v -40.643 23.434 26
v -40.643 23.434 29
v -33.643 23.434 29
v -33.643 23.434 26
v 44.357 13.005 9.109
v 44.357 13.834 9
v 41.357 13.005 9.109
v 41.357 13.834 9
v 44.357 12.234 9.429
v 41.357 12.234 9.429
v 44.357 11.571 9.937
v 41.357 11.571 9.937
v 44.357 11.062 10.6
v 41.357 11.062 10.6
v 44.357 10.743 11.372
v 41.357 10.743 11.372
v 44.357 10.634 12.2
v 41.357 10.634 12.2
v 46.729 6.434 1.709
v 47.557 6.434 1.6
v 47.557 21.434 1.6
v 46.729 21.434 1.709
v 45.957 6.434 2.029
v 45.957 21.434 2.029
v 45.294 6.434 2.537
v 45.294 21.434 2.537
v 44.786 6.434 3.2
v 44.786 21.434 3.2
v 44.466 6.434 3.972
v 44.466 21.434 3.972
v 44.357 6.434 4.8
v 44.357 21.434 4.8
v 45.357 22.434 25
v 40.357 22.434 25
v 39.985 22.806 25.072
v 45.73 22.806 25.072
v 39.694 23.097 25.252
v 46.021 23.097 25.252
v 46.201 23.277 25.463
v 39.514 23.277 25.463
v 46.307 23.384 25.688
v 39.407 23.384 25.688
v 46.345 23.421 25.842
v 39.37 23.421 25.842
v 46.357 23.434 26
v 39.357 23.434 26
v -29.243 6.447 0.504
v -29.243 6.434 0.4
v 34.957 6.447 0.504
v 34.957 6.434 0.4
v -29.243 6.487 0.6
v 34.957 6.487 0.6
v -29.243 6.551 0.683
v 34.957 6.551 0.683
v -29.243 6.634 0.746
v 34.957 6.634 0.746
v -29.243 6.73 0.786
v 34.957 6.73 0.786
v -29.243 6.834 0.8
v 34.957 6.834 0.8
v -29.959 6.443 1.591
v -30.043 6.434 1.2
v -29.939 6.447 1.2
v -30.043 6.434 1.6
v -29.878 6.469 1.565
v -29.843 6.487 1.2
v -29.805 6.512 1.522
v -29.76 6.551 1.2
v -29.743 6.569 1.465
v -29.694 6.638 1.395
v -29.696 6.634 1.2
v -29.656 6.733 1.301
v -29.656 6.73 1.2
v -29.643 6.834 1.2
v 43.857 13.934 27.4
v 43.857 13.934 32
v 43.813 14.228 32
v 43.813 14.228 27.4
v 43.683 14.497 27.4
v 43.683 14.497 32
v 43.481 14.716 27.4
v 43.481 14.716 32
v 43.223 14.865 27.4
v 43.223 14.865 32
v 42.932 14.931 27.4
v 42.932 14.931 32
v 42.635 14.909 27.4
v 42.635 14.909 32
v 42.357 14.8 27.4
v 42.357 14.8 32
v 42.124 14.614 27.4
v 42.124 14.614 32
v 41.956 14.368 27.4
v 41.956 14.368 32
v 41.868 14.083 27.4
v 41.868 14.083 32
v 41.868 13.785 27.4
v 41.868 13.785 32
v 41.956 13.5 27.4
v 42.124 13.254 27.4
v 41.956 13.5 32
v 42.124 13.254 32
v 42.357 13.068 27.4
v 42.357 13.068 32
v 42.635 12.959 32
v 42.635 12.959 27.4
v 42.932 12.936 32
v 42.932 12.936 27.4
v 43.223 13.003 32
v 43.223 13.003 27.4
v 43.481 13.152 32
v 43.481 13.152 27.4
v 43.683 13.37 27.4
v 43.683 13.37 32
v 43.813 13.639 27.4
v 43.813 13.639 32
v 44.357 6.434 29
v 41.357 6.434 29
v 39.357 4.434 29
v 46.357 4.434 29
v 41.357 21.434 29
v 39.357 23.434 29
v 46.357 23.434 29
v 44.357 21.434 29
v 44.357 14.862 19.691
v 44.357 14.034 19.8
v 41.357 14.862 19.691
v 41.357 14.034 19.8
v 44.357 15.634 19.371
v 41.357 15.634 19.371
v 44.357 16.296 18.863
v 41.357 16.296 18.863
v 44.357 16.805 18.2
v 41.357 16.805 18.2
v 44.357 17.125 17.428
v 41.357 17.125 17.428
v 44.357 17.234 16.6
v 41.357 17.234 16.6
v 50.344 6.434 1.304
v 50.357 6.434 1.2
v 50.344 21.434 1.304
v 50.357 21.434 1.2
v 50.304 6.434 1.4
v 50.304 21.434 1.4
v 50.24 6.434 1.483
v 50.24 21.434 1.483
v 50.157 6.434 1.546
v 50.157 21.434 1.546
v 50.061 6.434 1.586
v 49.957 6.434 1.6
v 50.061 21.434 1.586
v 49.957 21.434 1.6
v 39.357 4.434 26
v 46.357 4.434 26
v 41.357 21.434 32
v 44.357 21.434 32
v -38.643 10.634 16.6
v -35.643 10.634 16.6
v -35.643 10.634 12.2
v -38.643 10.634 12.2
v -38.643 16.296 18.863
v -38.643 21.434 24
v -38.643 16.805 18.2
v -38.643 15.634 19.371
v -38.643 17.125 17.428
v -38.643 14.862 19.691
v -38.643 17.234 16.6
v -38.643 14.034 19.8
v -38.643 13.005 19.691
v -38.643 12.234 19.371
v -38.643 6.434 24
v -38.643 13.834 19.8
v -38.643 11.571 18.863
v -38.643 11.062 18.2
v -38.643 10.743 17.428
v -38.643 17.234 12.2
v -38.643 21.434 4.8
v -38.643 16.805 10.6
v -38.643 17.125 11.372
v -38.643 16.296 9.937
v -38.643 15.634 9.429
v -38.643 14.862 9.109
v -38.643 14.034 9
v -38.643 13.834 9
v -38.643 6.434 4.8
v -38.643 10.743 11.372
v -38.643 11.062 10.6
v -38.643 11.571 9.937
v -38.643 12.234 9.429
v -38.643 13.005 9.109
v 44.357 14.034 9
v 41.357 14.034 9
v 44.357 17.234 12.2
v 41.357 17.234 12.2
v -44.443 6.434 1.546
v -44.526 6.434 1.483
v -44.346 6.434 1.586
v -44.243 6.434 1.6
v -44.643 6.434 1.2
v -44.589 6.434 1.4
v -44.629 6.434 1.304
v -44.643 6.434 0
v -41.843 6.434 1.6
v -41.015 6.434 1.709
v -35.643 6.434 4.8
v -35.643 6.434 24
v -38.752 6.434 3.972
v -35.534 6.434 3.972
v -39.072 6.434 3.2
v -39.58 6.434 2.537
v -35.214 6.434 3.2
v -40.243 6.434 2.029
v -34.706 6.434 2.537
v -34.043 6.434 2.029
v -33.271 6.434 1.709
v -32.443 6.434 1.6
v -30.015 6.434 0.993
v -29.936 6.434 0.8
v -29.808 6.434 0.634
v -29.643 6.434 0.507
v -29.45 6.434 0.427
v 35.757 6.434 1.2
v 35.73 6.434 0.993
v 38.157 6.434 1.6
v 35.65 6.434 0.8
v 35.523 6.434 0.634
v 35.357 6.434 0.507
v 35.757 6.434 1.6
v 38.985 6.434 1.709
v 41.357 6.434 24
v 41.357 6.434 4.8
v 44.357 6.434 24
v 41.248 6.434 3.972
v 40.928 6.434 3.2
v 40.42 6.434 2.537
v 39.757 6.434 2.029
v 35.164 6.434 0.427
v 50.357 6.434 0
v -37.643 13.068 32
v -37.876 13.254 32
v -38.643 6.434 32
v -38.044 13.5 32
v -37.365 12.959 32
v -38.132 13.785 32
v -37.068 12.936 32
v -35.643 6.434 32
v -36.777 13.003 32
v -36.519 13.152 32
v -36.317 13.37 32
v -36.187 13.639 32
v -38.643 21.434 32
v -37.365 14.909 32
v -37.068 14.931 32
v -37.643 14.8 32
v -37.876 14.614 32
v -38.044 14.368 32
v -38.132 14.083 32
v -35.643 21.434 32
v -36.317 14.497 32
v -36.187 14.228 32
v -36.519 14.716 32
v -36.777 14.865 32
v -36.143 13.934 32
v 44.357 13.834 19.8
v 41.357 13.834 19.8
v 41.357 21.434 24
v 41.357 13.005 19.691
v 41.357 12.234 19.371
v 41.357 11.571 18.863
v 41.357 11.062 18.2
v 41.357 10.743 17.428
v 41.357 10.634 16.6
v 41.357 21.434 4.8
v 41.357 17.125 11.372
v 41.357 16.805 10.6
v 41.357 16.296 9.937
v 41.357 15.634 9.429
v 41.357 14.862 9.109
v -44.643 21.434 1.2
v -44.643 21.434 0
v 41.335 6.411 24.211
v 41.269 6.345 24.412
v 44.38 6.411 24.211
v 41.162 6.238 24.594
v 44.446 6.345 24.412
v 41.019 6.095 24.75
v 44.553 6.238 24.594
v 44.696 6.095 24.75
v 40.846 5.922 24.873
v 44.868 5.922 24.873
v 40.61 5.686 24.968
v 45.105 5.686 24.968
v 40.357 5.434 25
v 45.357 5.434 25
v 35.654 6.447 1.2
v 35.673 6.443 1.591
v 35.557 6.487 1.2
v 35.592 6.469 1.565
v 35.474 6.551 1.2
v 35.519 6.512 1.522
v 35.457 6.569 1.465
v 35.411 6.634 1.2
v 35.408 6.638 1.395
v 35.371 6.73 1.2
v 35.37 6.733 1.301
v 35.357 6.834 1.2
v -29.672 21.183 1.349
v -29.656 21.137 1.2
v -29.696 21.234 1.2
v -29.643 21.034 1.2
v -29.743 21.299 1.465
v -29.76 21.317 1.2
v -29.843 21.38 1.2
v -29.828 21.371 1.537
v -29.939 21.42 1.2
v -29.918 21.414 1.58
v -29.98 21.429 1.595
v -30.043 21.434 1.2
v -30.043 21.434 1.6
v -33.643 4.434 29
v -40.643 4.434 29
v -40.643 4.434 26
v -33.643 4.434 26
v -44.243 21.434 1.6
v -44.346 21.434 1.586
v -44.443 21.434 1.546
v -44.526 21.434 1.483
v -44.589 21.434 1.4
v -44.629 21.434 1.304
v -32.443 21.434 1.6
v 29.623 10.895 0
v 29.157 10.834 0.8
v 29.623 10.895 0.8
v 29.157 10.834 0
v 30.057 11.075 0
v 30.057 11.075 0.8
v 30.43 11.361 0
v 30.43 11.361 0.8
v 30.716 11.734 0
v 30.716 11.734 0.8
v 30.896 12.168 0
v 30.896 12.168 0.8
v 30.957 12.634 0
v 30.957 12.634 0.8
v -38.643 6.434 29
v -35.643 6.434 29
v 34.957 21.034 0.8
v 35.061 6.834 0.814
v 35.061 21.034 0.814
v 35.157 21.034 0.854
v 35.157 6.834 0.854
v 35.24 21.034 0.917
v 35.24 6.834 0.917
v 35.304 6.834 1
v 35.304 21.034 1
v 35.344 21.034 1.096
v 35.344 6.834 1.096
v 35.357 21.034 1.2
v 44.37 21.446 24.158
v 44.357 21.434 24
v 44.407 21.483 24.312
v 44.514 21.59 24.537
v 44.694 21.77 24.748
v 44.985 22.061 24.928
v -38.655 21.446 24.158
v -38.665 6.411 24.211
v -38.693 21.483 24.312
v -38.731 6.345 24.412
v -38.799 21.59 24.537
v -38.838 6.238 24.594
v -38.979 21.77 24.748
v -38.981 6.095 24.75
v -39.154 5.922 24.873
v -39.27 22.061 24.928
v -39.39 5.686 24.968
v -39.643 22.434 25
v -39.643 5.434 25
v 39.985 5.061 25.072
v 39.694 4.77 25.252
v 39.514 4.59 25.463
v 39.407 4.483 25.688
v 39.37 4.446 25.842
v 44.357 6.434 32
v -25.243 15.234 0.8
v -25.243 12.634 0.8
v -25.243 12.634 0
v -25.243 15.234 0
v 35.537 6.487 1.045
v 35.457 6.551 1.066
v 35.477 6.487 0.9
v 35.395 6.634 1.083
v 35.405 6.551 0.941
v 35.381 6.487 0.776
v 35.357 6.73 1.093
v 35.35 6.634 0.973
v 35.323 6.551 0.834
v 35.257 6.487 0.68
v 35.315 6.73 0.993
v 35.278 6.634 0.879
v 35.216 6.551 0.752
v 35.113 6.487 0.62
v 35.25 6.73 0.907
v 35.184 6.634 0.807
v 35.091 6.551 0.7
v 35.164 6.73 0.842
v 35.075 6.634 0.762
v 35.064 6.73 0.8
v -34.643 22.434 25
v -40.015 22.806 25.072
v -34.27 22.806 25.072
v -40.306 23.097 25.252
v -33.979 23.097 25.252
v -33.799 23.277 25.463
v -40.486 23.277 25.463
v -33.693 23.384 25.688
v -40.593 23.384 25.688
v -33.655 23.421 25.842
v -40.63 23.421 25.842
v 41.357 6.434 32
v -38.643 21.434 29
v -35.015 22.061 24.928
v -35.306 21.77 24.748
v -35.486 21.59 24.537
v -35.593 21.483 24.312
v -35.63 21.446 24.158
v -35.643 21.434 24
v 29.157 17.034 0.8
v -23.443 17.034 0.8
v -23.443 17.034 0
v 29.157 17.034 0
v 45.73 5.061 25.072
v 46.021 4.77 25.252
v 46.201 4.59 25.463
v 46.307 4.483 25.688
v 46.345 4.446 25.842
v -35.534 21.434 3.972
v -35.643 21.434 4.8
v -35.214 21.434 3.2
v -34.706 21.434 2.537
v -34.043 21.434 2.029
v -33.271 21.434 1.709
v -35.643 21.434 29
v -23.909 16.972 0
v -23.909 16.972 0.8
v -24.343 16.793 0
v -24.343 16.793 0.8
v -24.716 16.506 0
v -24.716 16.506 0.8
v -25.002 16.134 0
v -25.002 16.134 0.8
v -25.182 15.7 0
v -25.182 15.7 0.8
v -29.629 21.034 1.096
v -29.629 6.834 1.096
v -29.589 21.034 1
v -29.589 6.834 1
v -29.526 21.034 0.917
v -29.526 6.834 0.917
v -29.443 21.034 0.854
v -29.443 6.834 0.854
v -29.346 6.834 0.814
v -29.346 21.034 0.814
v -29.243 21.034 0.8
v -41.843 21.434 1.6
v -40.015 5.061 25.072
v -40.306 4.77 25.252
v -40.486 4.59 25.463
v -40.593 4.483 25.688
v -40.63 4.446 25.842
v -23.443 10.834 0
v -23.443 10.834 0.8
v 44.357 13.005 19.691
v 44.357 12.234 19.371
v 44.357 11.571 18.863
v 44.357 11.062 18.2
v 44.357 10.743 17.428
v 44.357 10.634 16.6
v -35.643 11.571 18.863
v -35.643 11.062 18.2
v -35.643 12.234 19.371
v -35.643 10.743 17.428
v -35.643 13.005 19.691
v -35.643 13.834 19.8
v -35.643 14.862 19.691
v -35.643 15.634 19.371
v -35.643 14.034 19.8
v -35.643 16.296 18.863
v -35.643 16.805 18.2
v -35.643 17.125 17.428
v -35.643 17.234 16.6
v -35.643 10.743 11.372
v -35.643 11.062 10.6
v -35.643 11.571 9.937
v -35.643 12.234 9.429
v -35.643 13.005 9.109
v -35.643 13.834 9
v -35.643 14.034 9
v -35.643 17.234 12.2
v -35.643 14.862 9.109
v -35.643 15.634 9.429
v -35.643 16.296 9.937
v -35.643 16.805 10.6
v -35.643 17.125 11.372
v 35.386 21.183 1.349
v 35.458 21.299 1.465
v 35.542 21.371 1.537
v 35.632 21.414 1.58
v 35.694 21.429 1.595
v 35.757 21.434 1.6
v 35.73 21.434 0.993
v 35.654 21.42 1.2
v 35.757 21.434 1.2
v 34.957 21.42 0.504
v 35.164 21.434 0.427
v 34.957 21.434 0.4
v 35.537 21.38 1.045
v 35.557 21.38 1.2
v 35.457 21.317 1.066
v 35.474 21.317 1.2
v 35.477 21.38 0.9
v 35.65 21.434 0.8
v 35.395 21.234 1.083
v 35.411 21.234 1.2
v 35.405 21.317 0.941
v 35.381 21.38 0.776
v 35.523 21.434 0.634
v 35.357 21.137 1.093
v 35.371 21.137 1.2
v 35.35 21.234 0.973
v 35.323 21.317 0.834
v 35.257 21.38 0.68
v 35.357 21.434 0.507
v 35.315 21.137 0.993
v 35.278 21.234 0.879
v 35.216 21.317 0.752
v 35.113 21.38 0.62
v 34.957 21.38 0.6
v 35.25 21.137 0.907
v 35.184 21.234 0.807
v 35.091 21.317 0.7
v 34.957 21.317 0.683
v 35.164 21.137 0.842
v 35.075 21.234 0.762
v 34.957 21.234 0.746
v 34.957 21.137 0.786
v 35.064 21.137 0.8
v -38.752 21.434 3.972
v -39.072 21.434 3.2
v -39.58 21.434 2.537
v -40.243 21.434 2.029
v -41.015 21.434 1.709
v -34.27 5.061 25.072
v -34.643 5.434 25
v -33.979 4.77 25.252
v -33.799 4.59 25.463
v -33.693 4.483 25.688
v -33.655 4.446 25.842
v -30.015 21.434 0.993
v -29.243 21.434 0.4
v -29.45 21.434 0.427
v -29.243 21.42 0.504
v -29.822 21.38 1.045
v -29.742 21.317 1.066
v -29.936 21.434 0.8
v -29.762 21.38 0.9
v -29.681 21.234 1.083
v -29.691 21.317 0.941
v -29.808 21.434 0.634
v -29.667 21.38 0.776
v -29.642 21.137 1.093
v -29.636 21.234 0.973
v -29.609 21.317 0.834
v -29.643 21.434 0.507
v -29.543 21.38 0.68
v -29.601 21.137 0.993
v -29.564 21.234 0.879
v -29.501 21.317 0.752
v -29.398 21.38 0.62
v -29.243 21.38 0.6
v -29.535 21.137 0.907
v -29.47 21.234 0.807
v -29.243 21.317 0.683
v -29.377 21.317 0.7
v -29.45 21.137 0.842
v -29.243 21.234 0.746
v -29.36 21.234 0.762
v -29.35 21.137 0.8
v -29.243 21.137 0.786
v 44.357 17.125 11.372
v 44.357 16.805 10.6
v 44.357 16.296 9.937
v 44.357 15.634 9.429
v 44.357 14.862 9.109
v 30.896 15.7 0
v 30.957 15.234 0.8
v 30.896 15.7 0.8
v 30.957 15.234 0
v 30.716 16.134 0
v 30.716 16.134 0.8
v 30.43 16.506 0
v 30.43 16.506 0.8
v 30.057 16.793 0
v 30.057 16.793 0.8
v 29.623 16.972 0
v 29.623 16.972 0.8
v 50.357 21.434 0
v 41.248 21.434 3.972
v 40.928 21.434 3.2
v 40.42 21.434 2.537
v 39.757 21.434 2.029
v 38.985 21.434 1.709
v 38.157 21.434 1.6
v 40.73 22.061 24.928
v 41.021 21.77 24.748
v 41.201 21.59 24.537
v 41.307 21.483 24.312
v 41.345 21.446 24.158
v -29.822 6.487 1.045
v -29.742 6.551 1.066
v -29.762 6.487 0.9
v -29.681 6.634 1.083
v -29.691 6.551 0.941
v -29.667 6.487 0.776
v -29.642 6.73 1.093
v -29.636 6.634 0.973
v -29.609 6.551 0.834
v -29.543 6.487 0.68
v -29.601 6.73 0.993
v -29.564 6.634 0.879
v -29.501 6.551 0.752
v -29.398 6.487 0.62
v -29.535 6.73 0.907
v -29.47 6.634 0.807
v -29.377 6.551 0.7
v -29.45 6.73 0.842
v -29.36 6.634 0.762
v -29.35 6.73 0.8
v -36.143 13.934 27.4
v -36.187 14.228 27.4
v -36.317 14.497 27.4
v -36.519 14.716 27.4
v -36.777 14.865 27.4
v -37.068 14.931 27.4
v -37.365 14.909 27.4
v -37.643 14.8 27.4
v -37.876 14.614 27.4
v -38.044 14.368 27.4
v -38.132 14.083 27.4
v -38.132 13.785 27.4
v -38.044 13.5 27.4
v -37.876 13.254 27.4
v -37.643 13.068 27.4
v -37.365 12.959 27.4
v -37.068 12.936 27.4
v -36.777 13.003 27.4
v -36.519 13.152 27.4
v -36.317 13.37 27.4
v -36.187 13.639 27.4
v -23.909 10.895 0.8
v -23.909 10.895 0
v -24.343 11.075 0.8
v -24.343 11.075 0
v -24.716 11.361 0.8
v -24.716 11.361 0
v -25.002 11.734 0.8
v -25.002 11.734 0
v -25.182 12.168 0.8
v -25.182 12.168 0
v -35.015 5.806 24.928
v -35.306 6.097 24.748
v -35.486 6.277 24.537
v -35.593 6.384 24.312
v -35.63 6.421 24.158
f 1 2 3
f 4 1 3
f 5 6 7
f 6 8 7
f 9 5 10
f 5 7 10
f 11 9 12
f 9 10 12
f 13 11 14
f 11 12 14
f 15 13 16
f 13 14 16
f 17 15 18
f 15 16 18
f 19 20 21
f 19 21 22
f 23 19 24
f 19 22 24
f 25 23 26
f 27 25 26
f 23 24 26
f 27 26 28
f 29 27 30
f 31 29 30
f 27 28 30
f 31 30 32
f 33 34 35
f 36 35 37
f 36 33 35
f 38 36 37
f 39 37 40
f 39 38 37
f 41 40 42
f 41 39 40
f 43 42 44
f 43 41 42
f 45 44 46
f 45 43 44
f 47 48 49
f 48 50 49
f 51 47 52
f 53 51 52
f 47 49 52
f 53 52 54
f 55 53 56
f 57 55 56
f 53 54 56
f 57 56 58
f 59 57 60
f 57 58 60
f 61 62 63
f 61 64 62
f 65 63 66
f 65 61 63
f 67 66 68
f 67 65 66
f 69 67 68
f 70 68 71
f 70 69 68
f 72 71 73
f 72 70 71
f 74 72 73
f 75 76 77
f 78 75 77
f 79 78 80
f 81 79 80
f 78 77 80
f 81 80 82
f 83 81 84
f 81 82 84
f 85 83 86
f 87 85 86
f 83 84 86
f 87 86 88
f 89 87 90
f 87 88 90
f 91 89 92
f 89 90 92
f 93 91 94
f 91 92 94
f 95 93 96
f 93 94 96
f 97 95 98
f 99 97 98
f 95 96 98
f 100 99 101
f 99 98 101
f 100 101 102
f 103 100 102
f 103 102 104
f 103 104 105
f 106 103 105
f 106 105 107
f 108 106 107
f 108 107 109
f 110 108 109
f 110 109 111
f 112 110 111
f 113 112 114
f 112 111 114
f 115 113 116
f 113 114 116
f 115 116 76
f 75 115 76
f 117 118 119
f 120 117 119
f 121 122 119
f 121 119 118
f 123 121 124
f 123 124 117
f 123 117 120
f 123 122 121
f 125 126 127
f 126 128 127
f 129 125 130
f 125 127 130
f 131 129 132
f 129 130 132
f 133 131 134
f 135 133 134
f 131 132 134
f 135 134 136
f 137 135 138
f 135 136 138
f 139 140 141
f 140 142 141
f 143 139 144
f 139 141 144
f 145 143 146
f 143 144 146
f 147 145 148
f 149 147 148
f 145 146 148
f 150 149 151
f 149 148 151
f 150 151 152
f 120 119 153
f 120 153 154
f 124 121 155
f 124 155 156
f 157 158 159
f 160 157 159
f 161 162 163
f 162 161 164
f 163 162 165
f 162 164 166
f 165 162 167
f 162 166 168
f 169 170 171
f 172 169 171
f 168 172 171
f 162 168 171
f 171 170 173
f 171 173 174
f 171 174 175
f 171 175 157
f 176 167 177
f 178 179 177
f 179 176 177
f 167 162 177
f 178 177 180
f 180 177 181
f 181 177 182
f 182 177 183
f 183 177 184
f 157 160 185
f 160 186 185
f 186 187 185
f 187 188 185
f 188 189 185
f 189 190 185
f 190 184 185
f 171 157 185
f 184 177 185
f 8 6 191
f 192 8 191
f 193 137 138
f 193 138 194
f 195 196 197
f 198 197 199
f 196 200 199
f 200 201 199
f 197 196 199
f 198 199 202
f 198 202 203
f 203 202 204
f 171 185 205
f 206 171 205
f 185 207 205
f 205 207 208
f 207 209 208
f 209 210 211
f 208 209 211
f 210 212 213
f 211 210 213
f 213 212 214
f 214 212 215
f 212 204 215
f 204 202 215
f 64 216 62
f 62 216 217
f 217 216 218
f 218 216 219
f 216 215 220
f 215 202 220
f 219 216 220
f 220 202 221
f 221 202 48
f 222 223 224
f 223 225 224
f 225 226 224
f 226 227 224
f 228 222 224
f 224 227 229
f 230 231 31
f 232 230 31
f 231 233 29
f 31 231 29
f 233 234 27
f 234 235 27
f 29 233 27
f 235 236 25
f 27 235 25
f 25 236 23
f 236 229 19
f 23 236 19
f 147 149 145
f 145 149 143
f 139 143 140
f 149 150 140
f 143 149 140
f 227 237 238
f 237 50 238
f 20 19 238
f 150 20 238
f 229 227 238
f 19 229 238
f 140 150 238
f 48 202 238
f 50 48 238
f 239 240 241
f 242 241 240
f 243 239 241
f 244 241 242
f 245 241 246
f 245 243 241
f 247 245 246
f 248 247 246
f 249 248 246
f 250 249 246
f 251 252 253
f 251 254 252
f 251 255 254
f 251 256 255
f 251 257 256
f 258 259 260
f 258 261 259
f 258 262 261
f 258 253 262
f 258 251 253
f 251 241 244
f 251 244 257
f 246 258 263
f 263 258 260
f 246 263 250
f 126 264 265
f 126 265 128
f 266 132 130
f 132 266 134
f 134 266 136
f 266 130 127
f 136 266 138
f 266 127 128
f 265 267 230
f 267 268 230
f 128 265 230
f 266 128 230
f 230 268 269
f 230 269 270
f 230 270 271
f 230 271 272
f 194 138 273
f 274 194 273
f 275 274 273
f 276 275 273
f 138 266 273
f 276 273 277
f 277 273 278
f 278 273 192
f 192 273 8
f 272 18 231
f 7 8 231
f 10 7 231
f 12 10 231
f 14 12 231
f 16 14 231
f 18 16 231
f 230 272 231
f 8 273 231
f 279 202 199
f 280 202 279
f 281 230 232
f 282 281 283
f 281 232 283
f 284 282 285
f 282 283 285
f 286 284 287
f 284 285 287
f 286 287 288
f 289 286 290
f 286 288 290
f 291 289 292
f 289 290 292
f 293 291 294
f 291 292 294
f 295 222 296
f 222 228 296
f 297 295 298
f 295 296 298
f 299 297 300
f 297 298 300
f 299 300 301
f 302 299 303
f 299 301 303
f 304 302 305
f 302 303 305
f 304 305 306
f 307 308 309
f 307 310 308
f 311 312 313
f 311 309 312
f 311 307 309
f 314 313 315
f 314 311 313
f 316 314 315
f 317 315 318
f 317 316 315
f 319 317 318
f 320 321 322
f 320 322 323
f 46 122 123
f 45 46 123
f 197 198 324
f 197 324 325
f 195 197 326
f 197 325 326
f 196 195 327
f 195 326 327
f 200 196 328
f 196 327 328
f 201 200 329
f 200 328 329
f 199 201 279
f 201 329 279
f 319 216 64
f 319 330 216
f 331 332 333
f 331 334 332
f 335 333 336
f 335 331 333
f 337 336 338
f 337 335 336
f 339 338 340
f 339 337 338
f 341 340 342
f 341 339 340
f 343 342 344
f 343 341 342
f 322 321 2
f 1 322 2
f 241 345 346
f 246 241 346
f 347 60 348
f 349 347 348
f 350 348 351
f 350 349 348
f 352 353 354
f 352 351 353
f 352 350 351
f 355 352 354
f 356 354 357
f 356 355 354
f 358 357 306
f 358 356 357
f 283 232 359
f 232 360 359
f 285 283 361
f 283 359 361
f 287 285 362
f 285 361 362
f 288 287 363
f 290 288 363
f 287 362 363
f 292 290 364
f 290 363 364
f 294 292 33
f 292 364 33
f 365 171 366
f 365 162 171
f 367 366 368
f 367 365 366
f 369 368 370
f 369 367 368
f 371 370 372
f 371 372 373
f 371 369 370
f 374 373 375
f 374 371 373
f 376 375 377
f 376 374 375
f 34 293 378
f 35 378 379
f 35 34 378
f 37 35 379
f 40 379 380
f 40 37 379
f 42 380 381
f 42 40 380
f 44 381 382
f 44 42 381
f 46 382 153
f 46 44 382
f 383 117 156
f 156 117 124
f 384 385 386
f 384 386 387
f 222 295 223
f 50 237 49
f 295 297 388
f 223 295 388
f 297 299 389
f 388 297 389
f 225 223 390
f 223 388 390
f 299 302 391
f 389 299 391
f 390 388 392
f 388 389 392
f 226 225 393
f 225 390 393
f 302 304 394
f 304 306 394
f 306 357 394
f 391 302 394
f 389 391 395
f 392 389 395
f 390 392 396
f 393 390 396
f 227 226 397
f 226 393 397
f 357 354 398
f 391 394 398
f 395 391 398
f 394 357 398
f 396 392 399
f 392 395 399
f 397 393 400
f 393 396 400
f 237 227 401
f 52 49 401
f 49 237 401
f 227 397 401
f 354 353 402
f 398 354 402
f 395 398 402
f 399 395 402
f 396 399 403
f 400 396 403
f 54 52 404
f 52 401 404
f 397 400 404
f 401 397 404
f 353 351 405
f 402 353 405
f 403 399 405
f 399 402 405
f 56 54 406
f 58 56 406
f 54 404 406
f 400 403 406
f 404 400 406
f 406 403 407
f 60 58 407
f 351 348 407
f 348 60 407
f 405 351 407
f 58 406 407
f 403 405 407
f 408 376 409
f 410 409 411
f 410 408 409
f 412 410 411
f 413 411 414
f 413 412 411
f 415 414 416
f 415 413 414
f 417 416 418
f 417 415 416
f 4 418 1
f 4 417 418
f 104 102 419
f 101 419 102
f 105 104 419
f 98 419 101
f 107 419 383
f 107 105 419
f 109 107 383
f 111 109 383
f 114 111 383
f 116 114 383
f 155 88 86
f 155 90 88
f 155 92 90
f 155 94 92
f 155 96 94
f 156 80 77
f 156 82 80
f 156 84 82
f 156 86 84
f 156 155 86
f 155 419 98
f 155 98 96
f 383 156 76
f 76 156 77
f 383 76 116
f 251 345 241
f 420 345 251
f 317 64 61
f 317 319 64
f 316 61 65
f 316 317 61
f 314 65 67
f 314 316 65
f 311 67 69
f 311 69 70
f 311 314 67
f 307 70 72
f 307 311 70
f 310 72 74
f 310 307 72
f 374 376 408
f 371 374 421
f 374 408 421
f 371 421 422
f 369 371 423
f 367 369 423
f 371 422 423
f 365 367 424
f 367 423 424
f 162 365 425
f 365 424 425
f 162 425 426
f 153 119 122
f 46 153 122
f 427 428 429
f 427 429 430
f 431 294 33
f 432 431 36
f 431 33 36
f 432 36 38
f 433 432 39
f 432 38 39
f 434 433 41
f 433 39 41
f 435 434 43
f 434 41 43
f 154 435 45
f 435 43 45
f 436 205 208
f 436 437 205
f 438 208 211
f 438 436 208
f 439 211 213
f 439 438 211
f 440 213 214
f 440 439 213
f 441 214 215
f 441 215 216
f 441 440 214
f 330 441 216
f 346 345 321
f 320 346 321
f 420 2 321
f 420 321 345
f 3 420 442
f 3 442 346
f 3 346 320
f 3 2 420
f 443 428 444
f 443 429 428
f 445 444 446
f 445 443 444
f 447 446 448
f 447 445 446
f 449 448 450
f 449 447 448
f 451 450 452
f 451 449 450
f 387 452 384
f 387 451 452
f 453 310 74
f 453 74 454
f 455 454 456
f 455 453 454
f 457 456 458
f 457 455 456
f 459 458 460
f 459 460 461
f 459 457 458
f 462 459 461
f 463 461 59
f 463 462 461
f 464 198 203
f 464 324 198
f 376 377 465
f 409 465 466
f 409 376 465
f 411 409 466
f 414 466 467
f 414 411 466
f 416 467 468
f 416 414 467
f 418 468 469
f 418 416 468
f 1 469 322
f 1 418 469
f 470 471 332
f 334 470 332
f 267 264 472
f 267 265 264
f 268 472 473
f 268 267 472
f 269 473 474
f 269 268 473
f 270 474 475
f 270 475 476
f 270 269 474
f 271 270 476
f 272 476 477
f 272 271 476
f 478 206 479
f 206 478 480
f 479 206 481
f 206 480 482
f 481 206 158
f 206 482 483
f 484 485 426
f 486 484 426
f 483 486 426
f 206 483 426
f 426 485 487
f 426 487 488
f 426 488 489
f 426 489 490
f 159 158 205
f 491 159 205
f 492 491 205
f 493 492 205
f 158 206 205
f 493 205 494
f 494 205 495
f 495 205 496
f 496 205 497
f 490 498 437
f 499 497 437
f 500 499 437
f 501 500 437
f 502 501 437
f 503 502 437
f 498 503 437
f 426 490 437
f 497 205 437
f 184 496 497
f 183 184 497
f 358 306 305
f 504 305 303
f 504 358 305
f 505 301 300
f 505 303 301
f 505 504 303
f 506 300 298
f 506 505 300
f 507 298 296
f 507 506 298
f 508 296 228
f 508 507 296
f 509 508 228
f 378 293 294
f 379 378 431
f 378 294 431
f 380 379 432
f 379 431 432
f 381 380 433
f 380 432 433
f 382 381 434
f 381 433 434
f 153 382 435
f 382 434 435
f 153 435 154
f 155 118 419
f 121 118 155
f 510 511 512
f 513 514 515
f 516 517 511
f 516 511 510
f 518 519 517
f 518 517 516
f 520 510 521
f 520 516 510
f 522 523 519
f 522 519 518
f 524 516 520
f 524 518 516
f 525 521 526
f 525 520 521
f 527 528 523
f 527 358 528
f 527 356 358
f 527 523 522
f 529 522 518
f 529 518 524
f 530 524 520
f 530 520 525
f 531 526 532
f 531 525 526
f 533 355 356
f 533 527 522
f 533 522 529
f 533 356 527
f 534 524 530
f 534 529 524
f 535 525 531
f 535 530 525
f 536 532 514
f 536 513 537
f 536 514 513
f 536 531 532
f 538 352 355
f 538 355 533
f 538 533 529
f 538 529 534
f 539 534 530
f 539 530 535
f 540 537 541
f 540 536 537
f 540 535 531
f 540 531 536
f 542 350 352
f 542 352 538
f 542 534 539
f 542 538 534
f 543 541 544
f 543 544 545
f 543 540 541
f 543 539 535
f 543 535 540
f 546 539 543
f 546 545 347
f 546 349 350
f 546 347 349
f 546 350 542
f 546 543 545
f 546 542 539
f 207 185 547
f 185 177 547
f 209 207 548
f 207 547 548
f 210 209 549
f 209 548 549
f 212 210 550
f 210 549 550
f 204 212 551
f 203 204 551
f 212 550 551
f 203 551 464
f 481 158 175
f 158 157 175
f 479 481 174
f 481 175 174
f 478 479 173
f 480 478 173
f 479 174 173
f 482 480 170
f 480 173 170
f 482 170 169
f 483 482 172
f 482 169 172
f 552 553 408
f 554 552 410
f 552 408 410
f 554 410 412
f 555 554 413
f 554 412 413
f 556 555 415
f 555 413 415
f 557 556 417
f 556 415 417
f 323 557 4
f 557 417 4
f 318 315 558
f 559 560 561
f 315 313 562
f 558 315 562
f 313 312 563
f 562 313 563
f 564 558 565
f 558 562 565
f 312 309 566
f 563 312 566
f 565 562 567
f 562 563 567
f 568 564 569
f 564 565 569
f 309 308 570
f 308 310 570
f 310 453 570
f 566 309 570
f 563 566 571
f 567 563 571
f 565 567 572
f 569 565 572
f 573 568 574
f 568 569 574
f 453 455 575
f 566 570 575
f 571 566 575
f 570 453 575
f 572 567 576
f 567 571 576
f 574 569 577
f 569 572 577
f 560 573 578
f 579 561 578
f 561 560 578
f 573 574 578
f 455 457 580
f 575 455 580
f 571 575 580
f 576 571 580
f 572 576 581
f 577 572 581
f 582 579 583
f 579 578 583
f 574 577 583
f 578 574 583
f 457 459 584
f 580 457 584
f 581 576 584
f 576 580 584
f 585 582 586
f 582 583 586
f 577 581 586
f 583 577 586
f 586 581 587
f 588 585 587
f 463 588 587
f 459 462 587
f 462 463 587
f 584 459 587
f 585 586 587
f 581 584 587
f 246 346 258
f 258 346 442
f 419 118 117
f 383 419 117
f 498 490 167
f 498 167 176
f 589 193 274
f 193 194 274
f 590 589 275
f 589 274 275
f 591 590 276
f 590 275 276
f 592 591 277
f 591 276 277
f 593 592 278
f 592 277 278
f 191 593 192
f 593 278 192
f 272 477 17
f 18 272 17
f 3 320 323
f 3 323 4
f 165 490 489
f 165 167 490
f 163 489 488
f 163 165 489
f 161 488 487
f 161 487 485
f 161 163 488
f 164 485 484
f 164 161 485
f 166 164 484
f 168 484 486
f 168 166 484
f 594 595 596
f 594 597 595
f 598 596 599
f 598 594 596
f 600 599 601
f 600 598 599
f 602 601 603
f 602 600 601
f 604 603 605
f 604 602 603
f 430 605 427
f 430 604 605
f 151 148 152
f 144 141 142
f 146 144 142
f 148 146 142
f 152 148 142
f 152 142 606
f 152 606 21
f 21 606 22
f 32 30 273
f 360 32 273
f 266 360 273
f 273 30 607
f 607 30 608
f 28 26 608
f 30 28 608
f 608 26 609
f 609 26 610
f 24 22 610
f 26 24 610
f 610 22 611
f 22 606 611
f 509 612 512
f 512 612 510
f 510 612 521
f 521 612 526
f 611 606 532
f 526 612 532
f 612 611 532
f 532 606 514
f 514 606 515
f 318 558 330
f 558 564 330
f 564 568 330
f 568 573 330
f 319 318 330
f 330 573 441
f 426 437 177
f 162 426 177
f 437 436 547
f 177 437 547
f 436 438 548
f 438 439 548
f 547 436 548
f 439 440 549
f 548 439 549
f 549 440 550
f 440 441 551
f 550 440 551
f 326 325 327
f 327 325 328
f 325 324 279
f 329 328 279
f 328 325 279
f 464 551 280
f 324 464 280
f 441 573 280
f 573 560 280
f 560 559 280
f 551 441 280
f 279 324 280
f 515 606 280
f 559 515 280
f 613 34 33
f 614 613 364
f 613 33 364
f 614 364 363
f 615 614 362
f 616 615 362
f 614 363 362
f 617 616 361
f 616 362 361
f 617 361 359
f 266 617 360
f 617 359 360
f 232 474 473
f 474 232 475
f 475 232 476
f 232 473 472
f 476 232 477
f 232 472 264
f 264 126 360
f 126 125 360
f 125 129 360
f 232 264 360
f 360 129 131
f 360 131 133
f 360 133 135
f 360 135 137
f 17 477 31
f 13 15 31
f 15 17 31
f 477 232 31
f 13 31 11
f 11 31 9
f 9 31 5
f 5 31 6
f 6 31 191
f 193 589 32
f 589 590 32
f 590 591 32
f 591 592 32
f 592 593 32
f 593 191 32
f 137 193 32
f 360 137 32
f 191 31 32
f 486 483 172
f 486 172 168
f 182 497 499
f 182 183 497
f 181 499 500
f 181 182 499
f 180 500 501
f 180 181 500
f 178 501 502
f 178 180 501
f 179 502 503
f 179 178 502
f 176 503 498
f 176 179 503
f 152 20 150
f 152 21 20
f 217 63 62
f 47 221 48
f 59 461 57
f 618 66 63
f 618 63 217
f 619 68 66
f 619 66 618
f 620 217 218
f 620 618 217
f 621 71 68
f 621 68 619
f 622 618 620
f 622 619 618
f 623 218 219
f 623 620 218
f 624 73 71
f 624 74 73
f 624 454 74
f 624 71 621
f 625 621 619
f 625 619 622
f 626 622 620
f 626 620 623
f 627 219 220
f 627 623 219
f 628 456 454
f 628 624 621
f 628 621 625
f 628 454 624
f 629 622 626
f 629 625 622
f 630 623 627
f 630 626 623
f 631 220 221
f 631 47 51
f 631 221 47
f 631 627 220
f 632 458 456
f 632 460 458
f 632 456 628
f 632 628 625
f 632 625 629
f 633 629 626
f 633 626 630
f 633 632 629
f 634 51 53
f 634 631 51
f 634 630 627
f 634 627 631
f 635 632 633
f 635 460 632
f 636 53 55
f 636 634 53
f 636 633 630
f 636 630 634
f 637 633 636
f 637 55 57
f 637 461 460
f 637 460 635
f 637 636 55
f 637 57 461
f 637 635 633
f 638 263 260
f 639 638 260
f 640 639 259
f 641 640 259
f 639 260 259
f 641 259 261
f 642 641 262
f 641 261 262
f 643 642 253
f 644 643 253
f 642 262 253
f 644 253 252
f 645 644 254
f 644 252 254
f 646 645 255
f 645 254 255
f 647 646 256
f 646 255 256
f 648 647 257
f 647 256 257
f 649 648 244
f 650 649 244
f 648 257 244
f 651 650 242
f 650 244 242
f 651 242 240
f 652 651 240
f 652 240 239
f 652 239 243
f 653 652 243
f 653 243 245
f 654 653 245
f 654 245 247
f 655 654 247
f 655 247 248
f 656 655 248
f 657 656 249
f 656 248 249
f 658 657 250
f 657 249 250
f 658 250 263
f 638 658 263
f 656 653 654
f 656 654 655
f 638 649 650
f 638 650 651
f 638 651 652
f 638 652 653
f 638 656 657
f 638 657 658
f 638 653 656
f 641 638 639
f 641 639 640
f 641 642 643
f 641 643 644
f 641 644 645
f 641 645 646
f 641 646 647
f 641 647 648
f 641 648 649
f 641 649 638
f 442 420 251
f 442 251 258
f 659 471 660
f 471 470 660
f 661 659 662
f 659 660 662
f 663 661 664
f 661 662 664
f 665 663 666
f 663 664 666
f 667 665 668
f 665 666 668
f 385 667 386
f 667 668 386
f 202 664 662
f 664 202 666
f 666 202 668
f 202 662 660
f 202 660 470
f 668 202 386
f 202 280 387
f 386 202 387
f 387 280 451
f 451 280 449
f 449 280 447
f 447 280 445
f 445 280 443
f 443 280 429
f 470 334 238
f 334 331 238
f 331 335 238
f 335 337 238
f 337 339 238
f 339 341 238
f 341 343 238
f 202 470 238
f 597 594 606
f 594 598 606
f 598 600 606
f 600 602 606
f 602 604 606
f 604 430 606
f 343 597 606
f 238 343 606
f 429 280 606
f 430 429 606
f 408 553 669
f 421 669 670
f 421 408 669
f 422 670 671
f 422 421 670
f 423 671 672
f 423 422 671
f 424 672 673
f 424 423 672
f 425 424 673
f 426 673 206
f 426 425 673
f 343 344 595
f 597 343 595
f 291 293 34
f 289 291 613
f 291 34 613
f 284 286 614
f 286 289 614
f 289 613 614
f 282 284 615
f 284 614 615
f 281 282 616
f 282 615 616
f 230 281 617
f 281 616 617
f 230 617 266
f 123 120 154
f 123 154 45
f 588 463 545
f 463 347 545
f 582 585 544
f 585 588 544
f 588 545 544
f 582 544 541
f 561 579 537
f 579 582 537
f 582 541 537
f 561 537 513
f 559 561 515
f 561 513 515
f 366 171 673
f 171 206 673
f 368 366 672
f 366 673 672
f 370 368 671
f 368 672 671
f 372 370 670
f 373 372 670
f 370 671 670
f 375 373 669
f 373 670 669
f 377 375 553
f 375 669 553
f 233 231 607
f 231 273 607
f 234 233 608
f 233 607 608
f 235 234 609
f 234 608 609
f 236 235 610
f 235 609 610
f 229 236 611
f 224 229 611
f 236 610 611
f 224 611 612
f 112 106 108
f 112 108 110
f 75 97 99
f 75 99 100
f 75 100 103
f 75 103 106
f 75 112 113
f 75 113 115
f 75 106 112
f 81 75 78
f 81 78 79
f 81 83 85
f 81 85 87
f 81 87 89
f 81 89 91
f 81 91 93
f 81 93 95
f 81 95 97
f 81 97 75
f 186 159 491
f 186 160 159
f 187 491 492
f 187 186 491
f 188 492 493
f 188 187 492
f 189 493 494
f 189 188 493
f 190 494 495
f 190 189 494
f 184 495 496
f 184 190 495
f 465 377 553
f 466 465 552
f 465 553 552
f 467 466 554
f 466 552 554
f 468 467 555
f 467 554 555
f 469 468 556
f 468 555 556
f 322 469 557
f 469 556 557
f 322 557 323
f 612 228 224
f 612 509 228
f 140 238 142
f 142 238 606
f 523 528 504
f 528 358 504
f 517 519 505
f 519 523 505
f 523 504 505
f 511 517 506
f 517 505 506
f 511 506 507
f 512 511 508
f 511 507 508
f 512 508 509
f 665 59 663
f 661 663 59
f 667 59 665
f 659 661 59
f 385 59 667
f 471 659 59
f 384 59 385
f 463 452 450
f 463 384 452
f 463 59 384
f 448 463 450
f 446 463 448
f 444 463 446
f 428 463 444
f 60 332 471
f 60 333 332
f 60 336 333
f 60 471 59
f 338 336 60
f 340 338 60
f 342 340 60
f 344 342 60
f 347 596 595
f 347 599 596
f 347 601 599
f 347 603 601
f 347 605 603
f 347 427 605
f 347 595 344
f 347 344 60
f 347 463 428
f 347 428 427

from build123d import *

# Parameters (mm, degrees)
SKETCH1_W           = 65
SKETCH1_H           = 15
BOSS_EXTRUDE1_DEPTH = 0.8
SKETCH1_3_W         = 6
SKETCH1_3_H         = 15
BOSS_EXTRUDE2_DEPTH = 1.6
BOSS_EXTRUDE3_DEPTH = 29
SKETCH2_W           = 7
SKETCH2_H           = 19
SKETCH2_W_2         = 3
SKETCH2_H_2         = 15
BOSS_EXTRUDE4_DEPTH = 4
SKETCH2_2_W         = 3
SKETCH2_2_H         = 15
BOSS_EXTRUDE5_DEPTH = 3
SKETCH3_R           = 1
CUT_EXTRUDE1_DEPTH  = 4.6
FILLET1_R           = 3.2
FILLET2_R           = 0.4
FILLET3_R           = 1
SKETCH4_W           = 56.2
SKETCH4_H           = 6.2
CUT_EXTRUDE2_DEPTH  = 64.705737631
FILLET4_R           = 1.8
SKETCH5_W           = 10.8
SKETCH5_H           = 6.6
CUT_EXTRUDE3_DEPTH  = 98.437864541
FILLET5_R           = 3.2


with BuildPart() as part:
    # Sketch1 → Boss-Extrude1 (new body)
    with BuildSketch(Plane.XY):
        with Locations((2.857159974, 13.933681879)):
            Rectangle(SKETCH1_W, SKETCH1_H)
    extrude(amount=BOSS_EXTRUDE1_DEPTH)

    # Sketch1<3> → Boss-Extrude2 (add)
    with BuildSketch(Plane.XY):
        with Locations((-32.642840026, 13.933681879)):
            Rectangle(SKETCH1_3_W, SKETCH1_3_H)
        with Locations((-41.642840026, 13.933681879)):
            Rectangle(SKETCH1_3_W, SKETCH1_3_H)
        with Locations((38.357159974, 13.933681879)):
            Rectangle(SKETCH1_3_W, SKETCH1_3_H)
        with Locations((47.357159974, 13.933681879)):
            Rectangle(SKETCH1_3_W, SKETCH1_3_H)
    extrude(amount=BOSS_EXTRUDE2_DEPTH)


with BuildPart() as boss_extrude2_piece_1:
    # of the separate pieces the step leaves, piece 1, a body of its own (boss_extrude2_pieces)
    add(part.part.solids().sort_by_distance((41.357159974, 21.433681879, 0))[0])



with BuildPart() as boss_extrude2_piece_2:
    # of the separate pieces the step leaves, piece 2, a body of its own (boss_extrude2_pieces)
    add(part.part.solids().sort_by_distance((50.357159974, 6.433681879, 0))[0])


with BuildPart() as boss_extrude2_piece_3:
    # of the separate pieces the step leaves, piece 3, a body of its own (boss_extrude2_pieces)
    add(part.part.solids().sort_by_distance((-38.642840026, 6.433681879, 0))[0])


with BuildPart() as boss_extrude2_piece_1_1:
    add(boss_extrude2_piece_1.part)

    add(boss_extrude2_piece_2.part)  # Boss-Extrude3 merges Boss-Extrude2 piece 2

    add(boss_extrude2_piece_3.part)  # Boss-Extrude3 merges Boss-Extrude2 piece 3
    # Sketch1<4> → Boss-Extrude3 (add)
    with BuildSketch(Plane.XY):
        Polygon((-35.642840026, 6.433681879), (-35.642840026, 21.433681879), (-37.142840026, 21.433681879), (-38.642840026, 21.433681879), (-38.642840026, 6.433681879), (-37.142840026, 6.433681879), align=None)
        Polygon((42.857159974, 21.433681879), (41.357159974, 21.433681879), (41.357159974, 6.433681879), (42.857159974, 6.433681879), (44.357159974, 6.433681879), (44.357159974, 21.433681879), align=None)
    extrude(amount=BOSS_EXTRUDE3_DEPTH)

    # Sketch2 → Boss-Extrude4 (add)
    # profile 1 of 2: a face of its own
    with BuildSketch(Plane.XY.offset(29)):
        with Locations((-37.142840026, 13.933681879)):
            Rectangle(SKETCH2_W, SKETCH2_H)
        with Locations((-37.142840026, 13.933681879)):
            Rectangle(SKETCH2_W_2, SKETCH2_H_2, mode=Mode.SUBTRACT)
    # profile 2 of 2: a face of its own
    with BuildSketch(Plane.XY.offset(29)):
        with Locations((42.857159974, 13.933681879)):
            Rectangle(SKETCH2_W, SKETCH2_H)
        with Locations((42.857159974, 13.933681879)):
            Rectangle(SKETCH2_W_2, SKETCH2_H_2, mode=Mode.SUBTRACT)
    extrude(amount=-BOSS_EXTRUDE4_DEPTH)

    # Sketch2<2> → Boss-Extrude5 (add)
    with BuildSketch(Plane.XY.offset(29)):
        with Locations((-37.142840026, 13.933681879)):
            Rectangle(SKETCH2_2_W, SKETCH2_2_H)
        with Locations((42.857159974, 13.933681879)):
            Rectangle(SKETCH2_2_W, SKETCH2_2_H)
    extrude(amount=BOSS_EXTRUDE5_DEPTH)

    # Sketch3 → Cut-Extrude1 (cut)
    with BuildSketch(Plane.XY.offset(32)):
        with Locations((-37.142840026, 13.933681879)):
            Circle(SKETCH3_R)
        with Locations((42.857159974, 13.933681879)):
            Circle(SKETCH3_R)
    extrude(amount=-CUT_EXTRUDE1_DEPTH, mode=Mode.SUBTRACT)

    # Fillet1
    fillet1_edges = [boss_extrude2_piece_1_1.edges().sort_by_distance(p)[0] for p in [
        (44.357159974, 13.933681879, 1.6),
        (41.357159974, 13.933681879, 1.6),
        (-35.642840026, 13.933681879, 1.6),
        (-38.642840026, 13.933681879, 1.6),
    ]]
    fillet(fillet1_edges, radius=FILLET1_R)

    # Fillet2
    fillet2_edges = [boss_extrude2_piece_1_1.edges().sort_by_distance(p)[0] for p in [
        (-29.642840026, 21.433681879, 1.2),
        (35.357159974, 21.433681879, 1.2),
        (-29.642840026, 6.433681879, 1.2),
        (35.357159974, 6.433681879, 1.2),
        (2.857159974, 21.433681879, 0.8),
        (2.857159974, 6.433681879, 0.8),
        (50.357159974, 13.933681879, 1.6),
        (35.357159974, 13.933681879, 0.8),
        (35.357159974, 13.933681879, 1.6),
        (-29.642840026, 13.933681879, 0.8),
        (-29.642840026, 13.933681879, 1.6),
        (-44.642840026, 13.933681879, 1.6),
    ]]
    fillet(fillet2_edges, radius=FILLET2_R - 0.0001)  # a hair under: the kernel refuses the full size

    # Fillet3
    fillet3_edges = [boss_extrude2_piece_1_1.edges().sort_by_distance(p)[0] for p in [
        (-37.142840026, 23.433681879, 25),
        (-40.642840026, 13.933681879, 25),
        (-33.642840026, 13.933681879, 25),
        (-37.142840026, 4.433681879, 25),
        (42.857159974, 23.433681879, 25),
        (39.357159974, 13.933681879, 25),
        (42.857159974, 4.433681879, 25),
        (46.357159974, 13.933681879, 25),
        (42.857159974, 6.433681879, 25),
        (41.357159974, 13.933681879, 25),
        (42.857159974, 21.433681879, 25),
        (44.357159974, 13.933681879, 25),
        (-37.142840026, 21.433681879, 25),
        (-35.642840026, 13.933681879, 25),
        (-37.142840026, 6.433681879, 25),
        (-38.642840026, 13.933681879, 25),
    ]]
    fillet(fillet3_edges, radius=FILLET3_R - 0.0001)  # a hair under: the kernel refuses the full size

    # Sketch4 → Cut-Extrude2 (cut, through all)
    with BuildSketch(Plane.XY.offset(0.8)):
        with Locations((2.857159974, 13.933681879)):
            Rectangle(SKETCH4_W, SKETCH4_H)
    extrude(amount=-CUT_EXTRUDE2_DEPTH, mode=Mode.SUBTRACT)

    # Fillet4
    fillet4_edges = [boss_extrude2_piece_1_1.edges().sort_by_distance(p)[0] for p in [
        (30.957159974, 10.833681879, 0.4),
        (-25.242840026, 10.833681879, 0.4),
        (-25.242840026, 17.033681879, 0.4),
        (30.957159974, 17.033681879, 0.4),
    ]]
    fillet(fillet4_edges, radius=FILLET4_R)

    # Sketch5 → Cut-Extrude3 (cut, through all)
    with BuildSketch(Plane(origin=(44.357159974, 0, 0), x_dir=(0, 0, -1), z_dir=(1, 0, 0))):
        with Locations((-14.4, 13.933681879)):
            Rectangle(SKETCH5_W, SKETCH5_H)
    extrude(amount=-CUT_EXTRUDE3_DEPTH, mode=Mode.SUBTRACT)

    # Fillet5
    fillet5_edges = [boss_extrude2_piece_1_1.edges().sort_by_distance(p)[0] for p in [
        (-37.142840026, 17.233681879, 9),
        (42.857159974, 17.233681879, 9),
        (-37.142840026, 10.633681879, 9),
        (42.857159974, 10.633681879, 9),
        (-37.142840026, 10.633681879, 19.8),
        (42.857159974, 10.633681879, 19.8),
        (-37.142840026, 17.233681879, 19.8),
        (42.857159974, 17.233681879, 19.8),
    ]]
    fillet(fillet5_edges, radius=FILLET5_R)


solid = boss_extrude2_piece_1_1.part
